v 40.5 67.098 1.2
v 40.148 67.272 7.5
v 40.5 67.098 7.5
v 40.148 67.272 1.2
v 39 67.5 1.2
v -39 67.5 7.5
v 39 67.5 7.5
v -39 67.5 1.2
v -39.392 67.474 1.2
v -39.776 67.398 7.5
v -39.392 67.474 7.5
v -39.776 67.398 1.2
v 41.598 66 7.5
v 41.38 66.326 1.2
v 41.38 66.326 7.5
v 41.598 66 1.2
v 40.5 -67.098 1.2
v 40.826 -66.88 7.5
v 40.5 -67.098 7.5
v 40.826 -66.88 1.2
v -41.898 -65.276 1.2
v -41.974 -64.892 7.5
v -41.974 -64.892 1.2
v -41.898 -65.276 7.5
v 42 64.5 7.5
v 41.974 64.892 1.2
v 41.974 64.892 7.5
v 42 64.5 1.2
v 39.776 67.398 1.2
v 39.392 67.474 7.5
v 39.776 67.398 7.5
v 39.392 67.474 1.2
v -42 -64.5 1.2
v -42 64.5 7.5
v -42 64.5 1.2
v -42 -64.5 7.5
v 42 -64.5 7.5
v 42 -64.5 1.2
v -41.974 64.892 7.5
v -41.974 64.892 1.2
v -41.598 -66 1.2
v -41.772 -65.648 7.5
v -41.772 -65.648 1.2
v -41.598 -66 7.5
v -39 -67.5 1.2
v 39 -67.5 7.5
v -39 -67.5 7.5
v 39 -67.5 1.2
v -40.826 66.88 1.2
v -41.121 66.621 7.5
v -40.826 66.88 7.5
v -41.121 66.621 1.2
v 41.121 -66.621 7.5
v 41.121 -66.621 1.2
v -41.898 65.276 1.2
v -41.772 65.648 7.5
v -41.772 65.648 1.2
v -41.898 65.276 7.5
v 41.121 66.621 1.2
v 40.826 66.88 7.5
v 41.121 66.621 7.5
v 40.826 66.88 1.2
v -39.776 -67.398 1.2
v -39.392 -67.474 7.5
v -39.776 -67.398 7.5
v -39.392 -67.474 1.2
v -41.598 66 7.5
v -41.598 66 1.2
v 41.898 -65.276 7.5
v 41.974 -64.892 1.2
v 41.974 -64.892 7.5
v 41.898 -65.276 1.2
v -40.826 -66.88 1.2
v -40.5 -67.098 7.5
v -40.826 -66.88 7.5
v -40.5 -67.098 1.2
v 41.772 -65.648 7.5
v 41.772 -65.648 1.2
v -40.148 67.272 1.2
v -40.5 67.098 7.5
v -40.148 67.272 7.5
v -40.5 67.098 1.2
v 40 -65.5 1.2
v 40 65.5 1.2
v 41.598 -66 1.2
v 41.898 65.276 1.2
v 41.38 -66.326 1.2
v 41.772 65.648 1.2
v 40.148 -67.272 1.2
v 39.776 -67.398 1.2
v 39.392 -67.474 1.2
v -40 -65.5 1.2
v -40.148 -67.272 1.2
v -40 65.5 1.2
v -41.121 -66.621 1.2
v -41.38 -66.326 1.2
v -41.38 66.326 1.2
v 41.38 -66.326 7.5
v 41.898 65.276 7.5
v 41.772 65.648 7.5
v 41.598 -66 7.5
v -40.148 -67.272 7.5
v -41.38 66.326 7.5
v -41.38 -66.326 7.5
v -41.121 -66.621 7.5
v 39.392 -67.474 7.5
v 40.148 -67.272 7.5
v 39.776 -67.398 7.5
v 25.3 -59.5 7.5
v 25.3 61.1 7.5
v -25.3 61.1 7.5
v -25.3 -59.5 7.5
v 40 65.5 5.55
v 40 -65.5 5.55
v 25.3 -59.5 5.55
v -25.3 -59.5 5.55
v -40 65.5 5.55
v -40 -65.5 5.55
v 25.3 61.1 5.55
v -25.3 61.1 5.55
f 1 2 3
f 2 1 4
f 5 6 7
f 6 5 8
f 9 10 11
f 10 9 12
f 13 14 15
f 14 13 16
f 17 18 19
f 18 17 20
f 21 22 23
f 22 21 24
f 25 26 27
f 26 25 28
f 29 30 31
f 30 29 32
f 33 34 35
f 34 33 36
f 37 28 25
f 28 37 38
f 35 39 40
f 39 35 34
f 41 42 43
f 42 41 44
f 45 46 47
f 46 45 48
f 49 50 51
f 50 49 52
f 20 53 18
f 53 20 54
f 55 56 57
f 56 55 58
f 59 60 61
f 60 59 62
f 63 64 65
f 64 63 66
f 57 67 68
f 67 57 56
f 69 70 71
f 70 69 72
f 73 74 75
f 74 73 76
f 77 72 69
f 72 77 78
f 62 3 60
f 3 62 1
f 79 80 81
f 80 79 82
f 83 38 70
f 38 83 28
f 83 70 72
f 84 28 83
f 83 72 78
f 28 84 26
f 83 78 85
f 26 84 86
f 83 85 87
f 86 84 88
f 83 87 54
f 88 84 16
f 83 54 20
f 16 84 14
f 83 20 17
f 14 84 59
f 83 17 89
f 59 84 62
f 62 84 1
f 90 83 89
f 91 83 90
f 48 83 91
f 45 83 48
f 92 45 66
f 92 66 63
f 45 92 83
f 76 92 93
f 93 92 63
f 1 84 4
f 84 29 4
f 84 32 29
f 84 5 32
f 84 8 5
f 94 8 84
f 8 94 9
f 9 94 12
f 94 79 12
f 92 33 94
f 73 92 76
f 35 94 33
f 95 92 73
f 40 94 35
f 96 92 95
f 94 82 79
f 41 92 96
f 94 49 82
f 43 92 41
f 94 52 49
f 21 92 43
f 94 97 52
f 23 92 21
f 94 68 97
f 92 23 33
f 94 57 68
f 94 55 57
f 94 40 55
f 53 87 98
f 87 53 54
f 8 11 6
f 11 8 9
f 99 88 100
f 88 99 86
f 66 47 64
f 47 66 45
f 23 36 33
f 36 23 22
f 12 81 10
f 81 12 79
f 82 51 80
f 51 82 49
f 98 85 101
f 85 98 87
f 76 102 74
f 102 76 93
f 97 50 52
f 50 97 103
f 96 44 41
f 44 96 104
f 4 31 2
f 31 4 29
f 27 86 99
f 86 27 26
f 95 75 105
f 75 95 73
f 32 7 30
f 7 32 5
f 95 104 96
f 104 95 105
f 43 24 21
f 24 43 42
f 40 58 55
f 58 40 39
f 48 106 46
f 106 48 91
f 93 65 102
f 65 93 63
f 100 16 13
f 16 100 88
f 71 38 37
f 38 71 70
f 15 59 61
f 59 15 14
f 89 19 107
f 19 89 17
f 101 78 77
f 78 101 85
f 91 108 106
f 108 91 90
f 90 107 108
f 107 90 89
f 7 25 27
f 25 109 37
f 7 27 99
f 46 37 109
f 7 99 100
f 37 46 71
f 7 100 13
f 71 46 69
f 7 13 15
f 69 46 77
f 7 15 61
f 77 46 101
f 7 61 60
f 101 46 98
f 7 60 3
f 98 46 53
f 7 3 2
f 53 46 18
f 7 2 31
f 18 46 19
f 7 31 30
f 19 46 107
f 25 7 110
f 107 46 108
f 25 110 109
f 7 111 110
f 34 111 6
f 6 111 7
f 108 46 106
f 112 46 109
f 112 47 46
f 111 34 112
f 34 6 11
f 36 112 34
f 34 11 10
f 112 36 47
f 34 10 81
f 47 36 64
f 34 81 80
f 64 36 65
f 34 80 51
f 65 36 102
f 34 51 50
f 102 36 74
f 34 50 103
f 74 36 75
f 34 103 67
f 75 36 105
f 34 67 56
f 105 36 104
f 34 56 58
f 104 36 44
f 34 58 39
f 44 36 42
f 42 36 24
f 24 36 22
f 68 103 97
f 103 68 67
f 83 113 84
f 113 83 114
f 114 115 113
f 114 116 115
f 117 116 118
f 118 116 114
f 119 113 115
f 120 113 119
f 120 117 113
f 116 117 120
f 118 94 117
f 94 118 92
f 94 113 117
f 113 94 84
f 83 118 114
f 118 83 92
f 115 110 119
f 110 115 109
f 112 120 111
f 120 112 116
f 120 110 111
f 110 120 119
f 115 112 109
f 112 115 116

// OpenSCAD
color(alpha = 0.85, c = "DarkGray") {
	difference() {
		difference() {
			translate(v = [0, 0, 4.35]) {
				hull() {
					translate(v = [-39.0, -64.5, 0]) {
						cylinder($fn = 48, center = true, h = 6.3, r = 3.0);
					}
					translate(v = [-39.0, 64.5, 0]) {
						cylinder($fn = 48, center = true, h = 6.3, r = 3.0);
					}
					translate(v = [39.0, -64.5, 0]) {
						cylinder($fn = 48, center = true, h = 6.3, r = 3.0);
					}
					translate(v = [39.0, 64.5, 0]) {
						cylinder($fn = 48, center = true, h = 6.3, r = 3.0);
					}
				}
			}
			translate(v = [0, 0, 3.3500000000000005]) {
				cube(center = true, size = [80.0, 131.0, 4.3999999999999995]);
			}
		}
		translate(v = [0, 0.7999999999999972, 6.35]) {
			cube(center = true, size = [50.6, 120.6, 2.4]);
		}
	}
}
